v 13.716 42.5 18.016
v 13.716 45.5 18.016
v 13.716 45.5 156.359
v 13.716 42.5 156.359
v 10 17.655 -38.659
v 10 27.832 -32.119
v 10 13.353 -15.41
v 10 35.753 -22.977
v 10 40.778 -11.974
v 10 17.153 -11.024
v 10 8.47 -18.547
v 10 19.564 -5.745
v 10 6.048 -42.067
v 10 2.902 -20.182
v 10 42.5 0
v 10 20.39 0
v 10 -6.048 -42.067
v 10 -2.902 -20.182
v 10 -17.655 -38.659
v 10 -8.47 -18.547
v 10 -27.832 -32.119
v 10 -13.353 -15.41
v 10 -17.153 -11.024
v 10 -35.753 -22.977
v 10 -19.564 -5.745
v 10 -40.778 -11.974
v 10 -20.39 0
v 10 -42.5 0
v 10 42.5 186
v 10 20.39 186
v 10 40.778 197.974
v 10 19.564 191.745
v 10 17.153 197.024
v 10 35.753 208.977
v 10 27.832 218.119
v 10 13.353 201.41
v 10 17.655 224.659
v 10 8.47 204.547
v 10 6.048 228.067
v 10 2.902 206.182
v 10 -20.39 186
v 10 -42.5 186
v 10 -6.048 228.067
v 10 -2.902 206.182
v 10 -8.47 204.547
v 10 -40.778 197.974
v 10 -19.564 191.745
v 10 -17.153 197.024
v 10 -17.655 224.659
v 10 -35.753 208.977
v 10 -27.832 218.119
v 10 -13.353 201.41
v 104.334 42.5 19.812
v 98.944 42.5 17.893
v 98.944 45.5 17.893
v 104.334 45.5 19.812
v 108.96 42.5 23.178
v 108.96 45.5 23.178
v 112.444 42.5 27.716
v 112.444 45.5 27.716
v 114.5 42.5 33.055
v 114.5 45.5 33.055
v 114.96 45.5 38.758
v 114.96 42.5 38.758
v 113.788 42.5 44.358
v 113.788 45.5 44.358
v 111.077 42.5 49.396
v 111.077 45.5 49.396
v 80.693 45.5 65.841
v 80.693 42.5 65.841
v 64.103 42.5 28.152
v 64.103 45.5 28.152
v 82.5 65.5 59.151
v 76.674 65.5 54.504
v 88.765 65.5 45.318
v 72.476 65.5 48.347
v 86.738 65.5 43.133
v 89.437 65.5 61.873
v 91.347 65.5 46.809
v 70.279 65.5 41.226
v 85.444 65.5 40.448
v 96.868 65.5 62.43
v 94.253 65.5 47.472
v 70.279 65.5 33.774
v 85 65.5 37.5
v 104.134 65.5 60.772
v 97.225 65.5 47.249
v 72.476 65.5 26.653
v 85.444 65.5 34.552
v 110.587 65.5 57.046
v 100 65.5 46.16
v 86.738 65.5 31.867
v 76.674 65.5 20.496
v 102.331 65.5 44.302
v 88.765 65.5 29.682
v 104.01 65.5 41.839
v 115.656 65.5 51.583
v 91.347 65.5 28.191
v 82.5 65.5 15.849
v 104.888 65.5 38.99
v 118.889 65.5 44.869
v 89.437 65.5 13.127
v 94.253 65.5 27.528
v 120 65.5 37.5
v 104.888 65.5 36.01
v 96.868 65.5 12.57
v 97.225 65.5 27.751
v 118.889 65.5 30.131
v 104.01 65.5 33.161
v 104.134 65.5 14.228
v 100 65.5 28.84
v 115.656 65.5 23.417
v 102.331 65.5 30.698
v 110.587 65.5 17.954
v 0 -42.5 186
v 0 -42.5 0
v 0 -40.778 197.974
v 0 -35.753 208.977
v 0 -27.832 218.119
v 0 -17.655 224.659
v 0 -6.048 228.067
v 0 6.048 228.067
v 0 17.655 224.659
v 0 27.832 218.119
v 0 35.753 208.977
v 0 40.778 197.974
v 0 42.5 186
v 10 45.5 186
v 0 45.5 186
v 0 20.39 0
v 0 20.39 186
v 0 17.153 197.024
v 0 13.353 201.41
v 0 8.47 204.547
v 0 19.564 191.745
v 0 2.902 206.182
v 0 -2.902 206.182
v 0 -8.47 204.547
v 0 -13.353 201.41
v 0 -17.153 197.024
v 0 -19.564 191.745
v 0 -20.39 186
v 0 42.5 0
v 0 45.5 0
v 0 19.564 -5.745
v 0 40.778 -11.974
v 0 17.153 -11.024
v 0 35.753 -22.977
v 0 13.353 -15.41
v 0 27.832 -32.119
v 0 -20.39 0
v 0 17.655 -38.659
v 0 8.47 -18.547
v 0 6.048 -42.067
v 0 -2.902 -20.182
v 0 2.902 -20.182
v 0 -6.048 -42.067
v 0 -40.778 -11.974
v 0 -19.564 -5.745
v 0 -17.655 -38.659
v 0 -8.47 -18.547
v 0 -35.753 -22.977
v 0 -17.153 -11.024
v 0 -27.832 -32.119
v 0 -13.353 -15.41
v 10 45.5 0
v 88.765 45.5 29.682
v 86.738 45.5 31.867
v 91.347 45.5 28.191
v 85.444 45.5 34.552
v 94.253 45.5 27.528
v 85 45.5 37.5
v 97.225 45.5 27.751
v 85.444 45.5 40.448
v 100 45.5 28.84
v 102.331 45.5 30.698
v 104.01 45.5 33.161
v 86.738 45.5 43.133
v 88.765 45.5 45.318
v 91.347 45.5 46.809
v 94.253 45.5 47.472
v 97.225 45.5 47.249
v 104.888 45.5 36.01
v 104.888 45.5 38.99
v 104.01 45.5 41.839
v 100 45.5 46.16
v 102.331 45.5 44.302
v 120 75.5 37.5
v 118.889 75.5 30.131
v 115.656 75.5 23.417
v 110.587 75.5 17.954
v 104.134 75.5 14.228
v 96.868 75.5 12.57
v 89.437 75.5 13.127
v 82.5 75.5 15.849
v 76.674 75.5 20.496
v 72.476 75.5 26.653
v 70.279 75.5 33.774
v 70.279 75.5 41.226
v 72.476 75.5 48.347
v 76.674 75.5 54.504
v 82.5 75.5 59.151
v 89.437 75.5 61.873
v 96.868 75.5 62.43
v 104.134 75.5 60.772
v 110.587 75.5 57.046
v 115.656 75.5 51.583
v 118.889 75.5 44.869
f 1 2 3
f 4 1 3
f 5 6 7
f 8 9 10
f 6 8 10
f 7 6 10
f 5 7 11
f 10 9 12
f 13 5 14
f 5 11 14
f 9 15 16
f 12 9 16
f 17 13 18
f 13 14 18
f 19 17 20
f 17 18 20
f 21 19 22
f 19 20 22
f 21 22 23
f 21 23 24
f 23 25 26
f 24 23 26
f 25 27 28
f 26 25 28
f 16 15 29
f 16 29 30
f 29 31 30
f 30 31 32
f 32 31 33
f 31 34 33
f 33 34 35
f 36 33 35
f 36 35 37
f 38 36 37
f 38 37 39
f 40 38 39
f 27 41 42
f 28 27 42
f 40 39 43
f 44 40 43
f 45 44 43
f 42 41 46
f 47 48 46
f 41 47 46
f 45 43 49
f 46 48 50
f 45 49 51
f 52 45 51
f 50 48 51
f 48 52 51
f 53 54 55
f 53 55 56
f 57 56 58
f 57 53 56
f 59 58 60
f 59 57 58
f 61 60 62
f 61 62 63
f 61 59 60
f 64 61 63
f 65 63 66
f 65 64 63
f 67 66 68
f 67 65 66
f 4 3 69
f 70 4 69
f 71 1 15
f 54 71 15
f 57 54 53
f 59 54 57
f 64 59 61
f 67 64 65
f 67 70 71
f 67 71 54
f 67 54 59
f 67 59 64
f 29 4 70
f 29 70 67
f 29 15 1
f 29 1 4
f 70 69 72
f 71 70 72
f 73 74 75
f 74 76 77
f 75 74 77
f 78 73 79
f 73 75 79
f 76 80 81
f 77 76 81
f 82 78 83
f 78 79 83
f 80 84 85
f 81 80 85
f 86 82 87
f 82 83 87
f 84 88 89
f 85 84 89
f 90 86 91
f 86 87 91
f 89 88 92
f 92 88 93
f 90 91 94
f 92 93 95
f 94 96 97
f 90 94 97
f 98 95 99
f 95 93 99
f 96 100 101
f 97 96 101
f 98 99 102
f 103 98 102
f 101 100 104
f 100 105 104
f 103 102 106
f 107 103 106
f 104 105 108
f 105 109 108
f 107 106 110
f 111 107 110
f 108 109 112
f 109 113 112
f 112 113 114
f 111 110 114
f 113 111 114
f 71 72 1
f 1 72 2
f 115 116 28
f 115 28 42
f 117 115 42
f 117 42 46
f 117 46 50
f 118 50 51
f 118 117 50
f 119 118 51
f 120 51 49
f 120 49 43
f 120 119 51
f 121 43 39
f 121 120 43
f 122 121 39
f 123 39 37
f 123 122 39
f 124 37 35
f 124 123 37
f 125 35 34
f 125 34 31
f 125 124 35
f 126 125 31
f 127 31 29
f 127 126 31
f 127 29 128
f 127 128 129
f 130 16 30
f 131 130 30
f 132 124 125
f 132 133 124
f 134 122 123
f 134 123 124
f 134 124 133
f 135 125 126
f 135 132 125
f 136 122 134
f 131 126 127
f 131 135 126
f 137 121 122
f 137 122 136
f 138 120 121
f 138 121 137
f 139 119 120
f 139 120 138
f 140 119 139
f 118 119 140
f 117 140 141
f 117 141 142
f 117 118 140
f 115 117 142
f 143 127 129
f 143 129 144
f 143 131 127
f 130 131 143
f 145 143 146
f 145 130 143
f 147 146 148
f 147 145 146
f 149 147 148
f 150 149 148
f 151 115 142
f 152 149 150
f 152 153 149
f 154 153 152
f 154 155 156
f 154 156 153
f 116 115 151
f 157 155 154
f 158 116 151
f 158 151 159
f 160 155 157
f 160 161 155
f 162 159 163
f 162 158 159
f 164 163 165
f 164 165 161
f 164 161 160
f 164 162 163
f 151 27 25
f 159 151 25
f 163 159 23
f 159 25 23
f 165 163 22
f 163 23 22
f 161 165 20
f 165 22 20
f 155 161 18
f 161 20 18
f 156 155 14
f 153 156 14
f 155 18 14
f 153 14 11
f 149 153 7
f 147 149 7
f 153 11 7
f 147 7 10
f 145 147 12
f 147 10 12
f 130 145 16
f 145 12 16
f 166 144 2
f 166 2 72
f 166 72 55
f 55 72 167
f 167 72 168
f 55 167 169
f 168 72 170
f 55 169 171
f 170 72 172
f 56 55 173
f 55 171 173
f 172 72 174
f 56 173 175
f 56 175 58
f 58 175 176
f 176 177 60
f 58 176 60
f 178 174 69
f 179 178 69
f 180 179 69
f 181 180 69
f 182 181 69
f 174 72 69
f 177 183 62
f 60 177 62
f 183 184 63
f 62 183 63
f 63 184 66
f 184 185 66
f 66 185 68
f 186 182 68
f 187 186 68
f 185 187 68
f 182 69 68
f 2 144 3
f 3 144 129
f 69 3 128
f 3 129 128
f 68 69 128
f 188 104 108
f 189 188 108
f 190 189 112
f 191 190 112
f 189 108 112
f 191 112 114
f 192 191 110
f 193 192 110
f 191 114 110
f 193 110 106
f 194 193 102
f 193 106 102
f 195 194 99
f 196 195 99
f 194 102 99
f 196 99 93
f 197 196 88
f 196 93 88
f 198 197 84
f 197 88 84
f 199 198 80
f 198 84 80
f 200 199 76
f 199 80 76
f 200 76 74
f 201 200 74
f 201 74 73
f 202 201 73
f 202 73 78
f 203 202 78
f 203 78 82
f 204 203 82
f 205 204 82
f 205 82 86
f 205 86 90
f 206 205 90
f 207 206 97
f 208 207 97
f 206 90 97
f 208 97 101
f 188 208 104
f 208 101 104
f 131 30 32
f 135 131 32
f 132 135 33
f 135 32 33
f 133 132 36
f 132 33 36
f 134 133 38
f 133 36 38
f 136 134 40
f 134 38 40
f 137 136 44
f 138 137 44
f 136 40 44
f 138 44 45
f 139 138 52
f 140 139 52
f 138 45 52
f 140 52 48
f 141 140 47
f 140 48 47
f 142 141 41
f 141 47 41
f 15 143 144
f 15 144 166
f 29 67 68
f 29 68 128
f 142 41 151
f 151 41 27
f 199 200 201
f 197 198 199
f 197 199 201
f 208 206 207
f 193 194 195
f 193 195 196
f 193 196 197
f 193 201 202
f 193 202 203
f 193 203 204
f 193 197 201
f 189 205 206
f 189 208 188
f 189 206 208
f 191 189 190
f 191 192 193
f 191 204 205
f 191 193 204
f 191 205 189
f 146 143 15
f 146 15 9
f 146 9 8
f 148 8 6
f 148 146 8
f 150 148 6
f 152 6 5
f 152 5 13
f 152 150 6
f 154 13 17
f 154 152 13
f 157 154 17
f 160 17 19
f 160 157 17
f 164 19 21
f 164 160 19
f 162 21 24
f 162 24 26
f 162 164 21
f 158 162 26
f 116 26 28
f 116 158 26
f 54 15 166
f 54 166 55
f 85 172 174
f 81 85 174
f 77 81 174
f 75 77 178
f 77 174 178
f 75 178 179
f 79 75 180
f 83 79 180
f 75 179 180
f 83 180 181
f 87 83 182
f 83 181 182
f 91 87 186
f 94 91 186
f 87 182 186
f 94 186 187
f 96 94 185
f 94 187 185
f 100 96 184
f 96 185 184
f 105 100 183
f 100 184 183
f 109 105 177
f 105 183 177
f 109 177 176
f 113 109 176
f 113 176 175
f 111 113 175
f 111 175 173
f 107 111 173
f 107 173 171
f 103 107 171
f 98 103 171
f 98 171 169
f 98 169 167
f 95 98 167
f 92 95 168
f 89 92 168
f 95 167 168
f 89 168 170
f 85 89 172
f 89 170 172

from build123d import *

# Parameters (mm, degrees)
BOSS_EXTRUDE1_DEPTH = 10
BOSS_EXTRUDE2_DEPTH = 3
SKETCH3_R           = 10
BOSS_EXTRUDE3_DEPTH = 20
CUT_EXTRUDE1_DEPTH  = 11
CUT_EXTRUDE2_DEPTH  = 89
SKETCH6_R           = 25
BOSS_EXTRUDE4_DEPTH = 10


with BuildPart() as part:
    # Sketch1 → Boss-Extrude1 (new body)
    with BuildSketch(Plane(origin=(0, 0, 0), x_dir=(0, -1, 0), z_dir=(-1, 0, 0))):
        with BuildLine():
            Line((-42.5, 186), (-42.5, 0))
            ThreePointArc((-42.5, 0), (0, -42.5), (42.5, 0))
            Line((42.5, 0), (42.5, 186))
            ThreePointArc((42.5, 186), (0, 228.5), (-42.5, 186))
        make_face()
    extrude(amount=-BOSS_EXTRUDE1_DEPTH)

    # Sketch2 → Boss-Extrude2 (add)
    with BuildSketch(Plane(origin=(0, 42.5, 0), x_dir=(-1, 0, 0), z_dir=(0, 1, 0))):
        with BuildLine():
            Line((-10, 0), (-98.944350751, 17.892804965))
            ThreePointArc((-98.944350751, 17.892804965), (-113.663663971, 30.311978912), (-111.07737178, 49.396138729))
            Line((-111.07737178, 49.396138729), (-10, 186))
            Line((-10, 186), (0, 186))
            Line((0, 186), (0, 0))
            Line((0, 0), (-10, 0))
        make_face()
    extrude(amount=BOSS_EXTRUDE2_DEPTH)

    # Sketch3 → Boss-Extrude3 (add)
    with BuildSketch(Plane(origin=(0, 45.5, 0), x_dir=(-1, 0, 0), z_dir=(0, 1, 0))):
        with Locations((-95, 37.5)):
            Circle(SKETCH3_R)
    extrude(amount=BOSS_EXTRUDE3_DEPTH)

    # Sketch4 → Cut-Extrude1 (cut, through all)
    with BuildSketch(Plane(origin=(10, 0, 0), x_dir=(0, 0, -1), z_dir=(1, 0, 0))):
        with BuildLine():
            Line((0, 20.390002673), (-186, 20.390002673))
            ThreePointArc((-186, 20.390002673), (-206.390002673, 0), (-186, -20.390002673))
            Line((-186, -20.390002673), (0, -20.390002673))
            ThreePointArc((0, -20.390002673), (20.390002673, 0), (0, 20.390002673))
        make_face()
    extrude(amount=-CUT_EXTRUDE1_DEPTH, mode=Mode.SUBTRACT)

    # Sketch5 → Cut-Extrude2 (cut, through all)
    with BuildSketch(Plane(origin=(0, 45.5, 0), x_dir=(-1, 0, 0), z_dir=(0, 1, 0))):
        Polygon((-64.102931729, 28.152292708), (-13.715935026, 18.016014269), (-13.715935026, 156.359237723), (-80.693023557, 65.841164794), align=None)
    extrude(amount=-CUT_EXTRUDE2_DEPTH, mode=Mode.SUBTRACT)

    # Sketch6 → Boss-Extrude4 (add)
    with BuildSketch(Plane(origin=(0, 65.5, 0), x_dir=(1, 0, 0), z_dir=(0, 1, 0))):
        with Locations((95, -37.5)):
            Circle(SKETCH6_R)
    extrude(amount=BOSS_EXTRUDE4_DEPTH)


solid = part.part
